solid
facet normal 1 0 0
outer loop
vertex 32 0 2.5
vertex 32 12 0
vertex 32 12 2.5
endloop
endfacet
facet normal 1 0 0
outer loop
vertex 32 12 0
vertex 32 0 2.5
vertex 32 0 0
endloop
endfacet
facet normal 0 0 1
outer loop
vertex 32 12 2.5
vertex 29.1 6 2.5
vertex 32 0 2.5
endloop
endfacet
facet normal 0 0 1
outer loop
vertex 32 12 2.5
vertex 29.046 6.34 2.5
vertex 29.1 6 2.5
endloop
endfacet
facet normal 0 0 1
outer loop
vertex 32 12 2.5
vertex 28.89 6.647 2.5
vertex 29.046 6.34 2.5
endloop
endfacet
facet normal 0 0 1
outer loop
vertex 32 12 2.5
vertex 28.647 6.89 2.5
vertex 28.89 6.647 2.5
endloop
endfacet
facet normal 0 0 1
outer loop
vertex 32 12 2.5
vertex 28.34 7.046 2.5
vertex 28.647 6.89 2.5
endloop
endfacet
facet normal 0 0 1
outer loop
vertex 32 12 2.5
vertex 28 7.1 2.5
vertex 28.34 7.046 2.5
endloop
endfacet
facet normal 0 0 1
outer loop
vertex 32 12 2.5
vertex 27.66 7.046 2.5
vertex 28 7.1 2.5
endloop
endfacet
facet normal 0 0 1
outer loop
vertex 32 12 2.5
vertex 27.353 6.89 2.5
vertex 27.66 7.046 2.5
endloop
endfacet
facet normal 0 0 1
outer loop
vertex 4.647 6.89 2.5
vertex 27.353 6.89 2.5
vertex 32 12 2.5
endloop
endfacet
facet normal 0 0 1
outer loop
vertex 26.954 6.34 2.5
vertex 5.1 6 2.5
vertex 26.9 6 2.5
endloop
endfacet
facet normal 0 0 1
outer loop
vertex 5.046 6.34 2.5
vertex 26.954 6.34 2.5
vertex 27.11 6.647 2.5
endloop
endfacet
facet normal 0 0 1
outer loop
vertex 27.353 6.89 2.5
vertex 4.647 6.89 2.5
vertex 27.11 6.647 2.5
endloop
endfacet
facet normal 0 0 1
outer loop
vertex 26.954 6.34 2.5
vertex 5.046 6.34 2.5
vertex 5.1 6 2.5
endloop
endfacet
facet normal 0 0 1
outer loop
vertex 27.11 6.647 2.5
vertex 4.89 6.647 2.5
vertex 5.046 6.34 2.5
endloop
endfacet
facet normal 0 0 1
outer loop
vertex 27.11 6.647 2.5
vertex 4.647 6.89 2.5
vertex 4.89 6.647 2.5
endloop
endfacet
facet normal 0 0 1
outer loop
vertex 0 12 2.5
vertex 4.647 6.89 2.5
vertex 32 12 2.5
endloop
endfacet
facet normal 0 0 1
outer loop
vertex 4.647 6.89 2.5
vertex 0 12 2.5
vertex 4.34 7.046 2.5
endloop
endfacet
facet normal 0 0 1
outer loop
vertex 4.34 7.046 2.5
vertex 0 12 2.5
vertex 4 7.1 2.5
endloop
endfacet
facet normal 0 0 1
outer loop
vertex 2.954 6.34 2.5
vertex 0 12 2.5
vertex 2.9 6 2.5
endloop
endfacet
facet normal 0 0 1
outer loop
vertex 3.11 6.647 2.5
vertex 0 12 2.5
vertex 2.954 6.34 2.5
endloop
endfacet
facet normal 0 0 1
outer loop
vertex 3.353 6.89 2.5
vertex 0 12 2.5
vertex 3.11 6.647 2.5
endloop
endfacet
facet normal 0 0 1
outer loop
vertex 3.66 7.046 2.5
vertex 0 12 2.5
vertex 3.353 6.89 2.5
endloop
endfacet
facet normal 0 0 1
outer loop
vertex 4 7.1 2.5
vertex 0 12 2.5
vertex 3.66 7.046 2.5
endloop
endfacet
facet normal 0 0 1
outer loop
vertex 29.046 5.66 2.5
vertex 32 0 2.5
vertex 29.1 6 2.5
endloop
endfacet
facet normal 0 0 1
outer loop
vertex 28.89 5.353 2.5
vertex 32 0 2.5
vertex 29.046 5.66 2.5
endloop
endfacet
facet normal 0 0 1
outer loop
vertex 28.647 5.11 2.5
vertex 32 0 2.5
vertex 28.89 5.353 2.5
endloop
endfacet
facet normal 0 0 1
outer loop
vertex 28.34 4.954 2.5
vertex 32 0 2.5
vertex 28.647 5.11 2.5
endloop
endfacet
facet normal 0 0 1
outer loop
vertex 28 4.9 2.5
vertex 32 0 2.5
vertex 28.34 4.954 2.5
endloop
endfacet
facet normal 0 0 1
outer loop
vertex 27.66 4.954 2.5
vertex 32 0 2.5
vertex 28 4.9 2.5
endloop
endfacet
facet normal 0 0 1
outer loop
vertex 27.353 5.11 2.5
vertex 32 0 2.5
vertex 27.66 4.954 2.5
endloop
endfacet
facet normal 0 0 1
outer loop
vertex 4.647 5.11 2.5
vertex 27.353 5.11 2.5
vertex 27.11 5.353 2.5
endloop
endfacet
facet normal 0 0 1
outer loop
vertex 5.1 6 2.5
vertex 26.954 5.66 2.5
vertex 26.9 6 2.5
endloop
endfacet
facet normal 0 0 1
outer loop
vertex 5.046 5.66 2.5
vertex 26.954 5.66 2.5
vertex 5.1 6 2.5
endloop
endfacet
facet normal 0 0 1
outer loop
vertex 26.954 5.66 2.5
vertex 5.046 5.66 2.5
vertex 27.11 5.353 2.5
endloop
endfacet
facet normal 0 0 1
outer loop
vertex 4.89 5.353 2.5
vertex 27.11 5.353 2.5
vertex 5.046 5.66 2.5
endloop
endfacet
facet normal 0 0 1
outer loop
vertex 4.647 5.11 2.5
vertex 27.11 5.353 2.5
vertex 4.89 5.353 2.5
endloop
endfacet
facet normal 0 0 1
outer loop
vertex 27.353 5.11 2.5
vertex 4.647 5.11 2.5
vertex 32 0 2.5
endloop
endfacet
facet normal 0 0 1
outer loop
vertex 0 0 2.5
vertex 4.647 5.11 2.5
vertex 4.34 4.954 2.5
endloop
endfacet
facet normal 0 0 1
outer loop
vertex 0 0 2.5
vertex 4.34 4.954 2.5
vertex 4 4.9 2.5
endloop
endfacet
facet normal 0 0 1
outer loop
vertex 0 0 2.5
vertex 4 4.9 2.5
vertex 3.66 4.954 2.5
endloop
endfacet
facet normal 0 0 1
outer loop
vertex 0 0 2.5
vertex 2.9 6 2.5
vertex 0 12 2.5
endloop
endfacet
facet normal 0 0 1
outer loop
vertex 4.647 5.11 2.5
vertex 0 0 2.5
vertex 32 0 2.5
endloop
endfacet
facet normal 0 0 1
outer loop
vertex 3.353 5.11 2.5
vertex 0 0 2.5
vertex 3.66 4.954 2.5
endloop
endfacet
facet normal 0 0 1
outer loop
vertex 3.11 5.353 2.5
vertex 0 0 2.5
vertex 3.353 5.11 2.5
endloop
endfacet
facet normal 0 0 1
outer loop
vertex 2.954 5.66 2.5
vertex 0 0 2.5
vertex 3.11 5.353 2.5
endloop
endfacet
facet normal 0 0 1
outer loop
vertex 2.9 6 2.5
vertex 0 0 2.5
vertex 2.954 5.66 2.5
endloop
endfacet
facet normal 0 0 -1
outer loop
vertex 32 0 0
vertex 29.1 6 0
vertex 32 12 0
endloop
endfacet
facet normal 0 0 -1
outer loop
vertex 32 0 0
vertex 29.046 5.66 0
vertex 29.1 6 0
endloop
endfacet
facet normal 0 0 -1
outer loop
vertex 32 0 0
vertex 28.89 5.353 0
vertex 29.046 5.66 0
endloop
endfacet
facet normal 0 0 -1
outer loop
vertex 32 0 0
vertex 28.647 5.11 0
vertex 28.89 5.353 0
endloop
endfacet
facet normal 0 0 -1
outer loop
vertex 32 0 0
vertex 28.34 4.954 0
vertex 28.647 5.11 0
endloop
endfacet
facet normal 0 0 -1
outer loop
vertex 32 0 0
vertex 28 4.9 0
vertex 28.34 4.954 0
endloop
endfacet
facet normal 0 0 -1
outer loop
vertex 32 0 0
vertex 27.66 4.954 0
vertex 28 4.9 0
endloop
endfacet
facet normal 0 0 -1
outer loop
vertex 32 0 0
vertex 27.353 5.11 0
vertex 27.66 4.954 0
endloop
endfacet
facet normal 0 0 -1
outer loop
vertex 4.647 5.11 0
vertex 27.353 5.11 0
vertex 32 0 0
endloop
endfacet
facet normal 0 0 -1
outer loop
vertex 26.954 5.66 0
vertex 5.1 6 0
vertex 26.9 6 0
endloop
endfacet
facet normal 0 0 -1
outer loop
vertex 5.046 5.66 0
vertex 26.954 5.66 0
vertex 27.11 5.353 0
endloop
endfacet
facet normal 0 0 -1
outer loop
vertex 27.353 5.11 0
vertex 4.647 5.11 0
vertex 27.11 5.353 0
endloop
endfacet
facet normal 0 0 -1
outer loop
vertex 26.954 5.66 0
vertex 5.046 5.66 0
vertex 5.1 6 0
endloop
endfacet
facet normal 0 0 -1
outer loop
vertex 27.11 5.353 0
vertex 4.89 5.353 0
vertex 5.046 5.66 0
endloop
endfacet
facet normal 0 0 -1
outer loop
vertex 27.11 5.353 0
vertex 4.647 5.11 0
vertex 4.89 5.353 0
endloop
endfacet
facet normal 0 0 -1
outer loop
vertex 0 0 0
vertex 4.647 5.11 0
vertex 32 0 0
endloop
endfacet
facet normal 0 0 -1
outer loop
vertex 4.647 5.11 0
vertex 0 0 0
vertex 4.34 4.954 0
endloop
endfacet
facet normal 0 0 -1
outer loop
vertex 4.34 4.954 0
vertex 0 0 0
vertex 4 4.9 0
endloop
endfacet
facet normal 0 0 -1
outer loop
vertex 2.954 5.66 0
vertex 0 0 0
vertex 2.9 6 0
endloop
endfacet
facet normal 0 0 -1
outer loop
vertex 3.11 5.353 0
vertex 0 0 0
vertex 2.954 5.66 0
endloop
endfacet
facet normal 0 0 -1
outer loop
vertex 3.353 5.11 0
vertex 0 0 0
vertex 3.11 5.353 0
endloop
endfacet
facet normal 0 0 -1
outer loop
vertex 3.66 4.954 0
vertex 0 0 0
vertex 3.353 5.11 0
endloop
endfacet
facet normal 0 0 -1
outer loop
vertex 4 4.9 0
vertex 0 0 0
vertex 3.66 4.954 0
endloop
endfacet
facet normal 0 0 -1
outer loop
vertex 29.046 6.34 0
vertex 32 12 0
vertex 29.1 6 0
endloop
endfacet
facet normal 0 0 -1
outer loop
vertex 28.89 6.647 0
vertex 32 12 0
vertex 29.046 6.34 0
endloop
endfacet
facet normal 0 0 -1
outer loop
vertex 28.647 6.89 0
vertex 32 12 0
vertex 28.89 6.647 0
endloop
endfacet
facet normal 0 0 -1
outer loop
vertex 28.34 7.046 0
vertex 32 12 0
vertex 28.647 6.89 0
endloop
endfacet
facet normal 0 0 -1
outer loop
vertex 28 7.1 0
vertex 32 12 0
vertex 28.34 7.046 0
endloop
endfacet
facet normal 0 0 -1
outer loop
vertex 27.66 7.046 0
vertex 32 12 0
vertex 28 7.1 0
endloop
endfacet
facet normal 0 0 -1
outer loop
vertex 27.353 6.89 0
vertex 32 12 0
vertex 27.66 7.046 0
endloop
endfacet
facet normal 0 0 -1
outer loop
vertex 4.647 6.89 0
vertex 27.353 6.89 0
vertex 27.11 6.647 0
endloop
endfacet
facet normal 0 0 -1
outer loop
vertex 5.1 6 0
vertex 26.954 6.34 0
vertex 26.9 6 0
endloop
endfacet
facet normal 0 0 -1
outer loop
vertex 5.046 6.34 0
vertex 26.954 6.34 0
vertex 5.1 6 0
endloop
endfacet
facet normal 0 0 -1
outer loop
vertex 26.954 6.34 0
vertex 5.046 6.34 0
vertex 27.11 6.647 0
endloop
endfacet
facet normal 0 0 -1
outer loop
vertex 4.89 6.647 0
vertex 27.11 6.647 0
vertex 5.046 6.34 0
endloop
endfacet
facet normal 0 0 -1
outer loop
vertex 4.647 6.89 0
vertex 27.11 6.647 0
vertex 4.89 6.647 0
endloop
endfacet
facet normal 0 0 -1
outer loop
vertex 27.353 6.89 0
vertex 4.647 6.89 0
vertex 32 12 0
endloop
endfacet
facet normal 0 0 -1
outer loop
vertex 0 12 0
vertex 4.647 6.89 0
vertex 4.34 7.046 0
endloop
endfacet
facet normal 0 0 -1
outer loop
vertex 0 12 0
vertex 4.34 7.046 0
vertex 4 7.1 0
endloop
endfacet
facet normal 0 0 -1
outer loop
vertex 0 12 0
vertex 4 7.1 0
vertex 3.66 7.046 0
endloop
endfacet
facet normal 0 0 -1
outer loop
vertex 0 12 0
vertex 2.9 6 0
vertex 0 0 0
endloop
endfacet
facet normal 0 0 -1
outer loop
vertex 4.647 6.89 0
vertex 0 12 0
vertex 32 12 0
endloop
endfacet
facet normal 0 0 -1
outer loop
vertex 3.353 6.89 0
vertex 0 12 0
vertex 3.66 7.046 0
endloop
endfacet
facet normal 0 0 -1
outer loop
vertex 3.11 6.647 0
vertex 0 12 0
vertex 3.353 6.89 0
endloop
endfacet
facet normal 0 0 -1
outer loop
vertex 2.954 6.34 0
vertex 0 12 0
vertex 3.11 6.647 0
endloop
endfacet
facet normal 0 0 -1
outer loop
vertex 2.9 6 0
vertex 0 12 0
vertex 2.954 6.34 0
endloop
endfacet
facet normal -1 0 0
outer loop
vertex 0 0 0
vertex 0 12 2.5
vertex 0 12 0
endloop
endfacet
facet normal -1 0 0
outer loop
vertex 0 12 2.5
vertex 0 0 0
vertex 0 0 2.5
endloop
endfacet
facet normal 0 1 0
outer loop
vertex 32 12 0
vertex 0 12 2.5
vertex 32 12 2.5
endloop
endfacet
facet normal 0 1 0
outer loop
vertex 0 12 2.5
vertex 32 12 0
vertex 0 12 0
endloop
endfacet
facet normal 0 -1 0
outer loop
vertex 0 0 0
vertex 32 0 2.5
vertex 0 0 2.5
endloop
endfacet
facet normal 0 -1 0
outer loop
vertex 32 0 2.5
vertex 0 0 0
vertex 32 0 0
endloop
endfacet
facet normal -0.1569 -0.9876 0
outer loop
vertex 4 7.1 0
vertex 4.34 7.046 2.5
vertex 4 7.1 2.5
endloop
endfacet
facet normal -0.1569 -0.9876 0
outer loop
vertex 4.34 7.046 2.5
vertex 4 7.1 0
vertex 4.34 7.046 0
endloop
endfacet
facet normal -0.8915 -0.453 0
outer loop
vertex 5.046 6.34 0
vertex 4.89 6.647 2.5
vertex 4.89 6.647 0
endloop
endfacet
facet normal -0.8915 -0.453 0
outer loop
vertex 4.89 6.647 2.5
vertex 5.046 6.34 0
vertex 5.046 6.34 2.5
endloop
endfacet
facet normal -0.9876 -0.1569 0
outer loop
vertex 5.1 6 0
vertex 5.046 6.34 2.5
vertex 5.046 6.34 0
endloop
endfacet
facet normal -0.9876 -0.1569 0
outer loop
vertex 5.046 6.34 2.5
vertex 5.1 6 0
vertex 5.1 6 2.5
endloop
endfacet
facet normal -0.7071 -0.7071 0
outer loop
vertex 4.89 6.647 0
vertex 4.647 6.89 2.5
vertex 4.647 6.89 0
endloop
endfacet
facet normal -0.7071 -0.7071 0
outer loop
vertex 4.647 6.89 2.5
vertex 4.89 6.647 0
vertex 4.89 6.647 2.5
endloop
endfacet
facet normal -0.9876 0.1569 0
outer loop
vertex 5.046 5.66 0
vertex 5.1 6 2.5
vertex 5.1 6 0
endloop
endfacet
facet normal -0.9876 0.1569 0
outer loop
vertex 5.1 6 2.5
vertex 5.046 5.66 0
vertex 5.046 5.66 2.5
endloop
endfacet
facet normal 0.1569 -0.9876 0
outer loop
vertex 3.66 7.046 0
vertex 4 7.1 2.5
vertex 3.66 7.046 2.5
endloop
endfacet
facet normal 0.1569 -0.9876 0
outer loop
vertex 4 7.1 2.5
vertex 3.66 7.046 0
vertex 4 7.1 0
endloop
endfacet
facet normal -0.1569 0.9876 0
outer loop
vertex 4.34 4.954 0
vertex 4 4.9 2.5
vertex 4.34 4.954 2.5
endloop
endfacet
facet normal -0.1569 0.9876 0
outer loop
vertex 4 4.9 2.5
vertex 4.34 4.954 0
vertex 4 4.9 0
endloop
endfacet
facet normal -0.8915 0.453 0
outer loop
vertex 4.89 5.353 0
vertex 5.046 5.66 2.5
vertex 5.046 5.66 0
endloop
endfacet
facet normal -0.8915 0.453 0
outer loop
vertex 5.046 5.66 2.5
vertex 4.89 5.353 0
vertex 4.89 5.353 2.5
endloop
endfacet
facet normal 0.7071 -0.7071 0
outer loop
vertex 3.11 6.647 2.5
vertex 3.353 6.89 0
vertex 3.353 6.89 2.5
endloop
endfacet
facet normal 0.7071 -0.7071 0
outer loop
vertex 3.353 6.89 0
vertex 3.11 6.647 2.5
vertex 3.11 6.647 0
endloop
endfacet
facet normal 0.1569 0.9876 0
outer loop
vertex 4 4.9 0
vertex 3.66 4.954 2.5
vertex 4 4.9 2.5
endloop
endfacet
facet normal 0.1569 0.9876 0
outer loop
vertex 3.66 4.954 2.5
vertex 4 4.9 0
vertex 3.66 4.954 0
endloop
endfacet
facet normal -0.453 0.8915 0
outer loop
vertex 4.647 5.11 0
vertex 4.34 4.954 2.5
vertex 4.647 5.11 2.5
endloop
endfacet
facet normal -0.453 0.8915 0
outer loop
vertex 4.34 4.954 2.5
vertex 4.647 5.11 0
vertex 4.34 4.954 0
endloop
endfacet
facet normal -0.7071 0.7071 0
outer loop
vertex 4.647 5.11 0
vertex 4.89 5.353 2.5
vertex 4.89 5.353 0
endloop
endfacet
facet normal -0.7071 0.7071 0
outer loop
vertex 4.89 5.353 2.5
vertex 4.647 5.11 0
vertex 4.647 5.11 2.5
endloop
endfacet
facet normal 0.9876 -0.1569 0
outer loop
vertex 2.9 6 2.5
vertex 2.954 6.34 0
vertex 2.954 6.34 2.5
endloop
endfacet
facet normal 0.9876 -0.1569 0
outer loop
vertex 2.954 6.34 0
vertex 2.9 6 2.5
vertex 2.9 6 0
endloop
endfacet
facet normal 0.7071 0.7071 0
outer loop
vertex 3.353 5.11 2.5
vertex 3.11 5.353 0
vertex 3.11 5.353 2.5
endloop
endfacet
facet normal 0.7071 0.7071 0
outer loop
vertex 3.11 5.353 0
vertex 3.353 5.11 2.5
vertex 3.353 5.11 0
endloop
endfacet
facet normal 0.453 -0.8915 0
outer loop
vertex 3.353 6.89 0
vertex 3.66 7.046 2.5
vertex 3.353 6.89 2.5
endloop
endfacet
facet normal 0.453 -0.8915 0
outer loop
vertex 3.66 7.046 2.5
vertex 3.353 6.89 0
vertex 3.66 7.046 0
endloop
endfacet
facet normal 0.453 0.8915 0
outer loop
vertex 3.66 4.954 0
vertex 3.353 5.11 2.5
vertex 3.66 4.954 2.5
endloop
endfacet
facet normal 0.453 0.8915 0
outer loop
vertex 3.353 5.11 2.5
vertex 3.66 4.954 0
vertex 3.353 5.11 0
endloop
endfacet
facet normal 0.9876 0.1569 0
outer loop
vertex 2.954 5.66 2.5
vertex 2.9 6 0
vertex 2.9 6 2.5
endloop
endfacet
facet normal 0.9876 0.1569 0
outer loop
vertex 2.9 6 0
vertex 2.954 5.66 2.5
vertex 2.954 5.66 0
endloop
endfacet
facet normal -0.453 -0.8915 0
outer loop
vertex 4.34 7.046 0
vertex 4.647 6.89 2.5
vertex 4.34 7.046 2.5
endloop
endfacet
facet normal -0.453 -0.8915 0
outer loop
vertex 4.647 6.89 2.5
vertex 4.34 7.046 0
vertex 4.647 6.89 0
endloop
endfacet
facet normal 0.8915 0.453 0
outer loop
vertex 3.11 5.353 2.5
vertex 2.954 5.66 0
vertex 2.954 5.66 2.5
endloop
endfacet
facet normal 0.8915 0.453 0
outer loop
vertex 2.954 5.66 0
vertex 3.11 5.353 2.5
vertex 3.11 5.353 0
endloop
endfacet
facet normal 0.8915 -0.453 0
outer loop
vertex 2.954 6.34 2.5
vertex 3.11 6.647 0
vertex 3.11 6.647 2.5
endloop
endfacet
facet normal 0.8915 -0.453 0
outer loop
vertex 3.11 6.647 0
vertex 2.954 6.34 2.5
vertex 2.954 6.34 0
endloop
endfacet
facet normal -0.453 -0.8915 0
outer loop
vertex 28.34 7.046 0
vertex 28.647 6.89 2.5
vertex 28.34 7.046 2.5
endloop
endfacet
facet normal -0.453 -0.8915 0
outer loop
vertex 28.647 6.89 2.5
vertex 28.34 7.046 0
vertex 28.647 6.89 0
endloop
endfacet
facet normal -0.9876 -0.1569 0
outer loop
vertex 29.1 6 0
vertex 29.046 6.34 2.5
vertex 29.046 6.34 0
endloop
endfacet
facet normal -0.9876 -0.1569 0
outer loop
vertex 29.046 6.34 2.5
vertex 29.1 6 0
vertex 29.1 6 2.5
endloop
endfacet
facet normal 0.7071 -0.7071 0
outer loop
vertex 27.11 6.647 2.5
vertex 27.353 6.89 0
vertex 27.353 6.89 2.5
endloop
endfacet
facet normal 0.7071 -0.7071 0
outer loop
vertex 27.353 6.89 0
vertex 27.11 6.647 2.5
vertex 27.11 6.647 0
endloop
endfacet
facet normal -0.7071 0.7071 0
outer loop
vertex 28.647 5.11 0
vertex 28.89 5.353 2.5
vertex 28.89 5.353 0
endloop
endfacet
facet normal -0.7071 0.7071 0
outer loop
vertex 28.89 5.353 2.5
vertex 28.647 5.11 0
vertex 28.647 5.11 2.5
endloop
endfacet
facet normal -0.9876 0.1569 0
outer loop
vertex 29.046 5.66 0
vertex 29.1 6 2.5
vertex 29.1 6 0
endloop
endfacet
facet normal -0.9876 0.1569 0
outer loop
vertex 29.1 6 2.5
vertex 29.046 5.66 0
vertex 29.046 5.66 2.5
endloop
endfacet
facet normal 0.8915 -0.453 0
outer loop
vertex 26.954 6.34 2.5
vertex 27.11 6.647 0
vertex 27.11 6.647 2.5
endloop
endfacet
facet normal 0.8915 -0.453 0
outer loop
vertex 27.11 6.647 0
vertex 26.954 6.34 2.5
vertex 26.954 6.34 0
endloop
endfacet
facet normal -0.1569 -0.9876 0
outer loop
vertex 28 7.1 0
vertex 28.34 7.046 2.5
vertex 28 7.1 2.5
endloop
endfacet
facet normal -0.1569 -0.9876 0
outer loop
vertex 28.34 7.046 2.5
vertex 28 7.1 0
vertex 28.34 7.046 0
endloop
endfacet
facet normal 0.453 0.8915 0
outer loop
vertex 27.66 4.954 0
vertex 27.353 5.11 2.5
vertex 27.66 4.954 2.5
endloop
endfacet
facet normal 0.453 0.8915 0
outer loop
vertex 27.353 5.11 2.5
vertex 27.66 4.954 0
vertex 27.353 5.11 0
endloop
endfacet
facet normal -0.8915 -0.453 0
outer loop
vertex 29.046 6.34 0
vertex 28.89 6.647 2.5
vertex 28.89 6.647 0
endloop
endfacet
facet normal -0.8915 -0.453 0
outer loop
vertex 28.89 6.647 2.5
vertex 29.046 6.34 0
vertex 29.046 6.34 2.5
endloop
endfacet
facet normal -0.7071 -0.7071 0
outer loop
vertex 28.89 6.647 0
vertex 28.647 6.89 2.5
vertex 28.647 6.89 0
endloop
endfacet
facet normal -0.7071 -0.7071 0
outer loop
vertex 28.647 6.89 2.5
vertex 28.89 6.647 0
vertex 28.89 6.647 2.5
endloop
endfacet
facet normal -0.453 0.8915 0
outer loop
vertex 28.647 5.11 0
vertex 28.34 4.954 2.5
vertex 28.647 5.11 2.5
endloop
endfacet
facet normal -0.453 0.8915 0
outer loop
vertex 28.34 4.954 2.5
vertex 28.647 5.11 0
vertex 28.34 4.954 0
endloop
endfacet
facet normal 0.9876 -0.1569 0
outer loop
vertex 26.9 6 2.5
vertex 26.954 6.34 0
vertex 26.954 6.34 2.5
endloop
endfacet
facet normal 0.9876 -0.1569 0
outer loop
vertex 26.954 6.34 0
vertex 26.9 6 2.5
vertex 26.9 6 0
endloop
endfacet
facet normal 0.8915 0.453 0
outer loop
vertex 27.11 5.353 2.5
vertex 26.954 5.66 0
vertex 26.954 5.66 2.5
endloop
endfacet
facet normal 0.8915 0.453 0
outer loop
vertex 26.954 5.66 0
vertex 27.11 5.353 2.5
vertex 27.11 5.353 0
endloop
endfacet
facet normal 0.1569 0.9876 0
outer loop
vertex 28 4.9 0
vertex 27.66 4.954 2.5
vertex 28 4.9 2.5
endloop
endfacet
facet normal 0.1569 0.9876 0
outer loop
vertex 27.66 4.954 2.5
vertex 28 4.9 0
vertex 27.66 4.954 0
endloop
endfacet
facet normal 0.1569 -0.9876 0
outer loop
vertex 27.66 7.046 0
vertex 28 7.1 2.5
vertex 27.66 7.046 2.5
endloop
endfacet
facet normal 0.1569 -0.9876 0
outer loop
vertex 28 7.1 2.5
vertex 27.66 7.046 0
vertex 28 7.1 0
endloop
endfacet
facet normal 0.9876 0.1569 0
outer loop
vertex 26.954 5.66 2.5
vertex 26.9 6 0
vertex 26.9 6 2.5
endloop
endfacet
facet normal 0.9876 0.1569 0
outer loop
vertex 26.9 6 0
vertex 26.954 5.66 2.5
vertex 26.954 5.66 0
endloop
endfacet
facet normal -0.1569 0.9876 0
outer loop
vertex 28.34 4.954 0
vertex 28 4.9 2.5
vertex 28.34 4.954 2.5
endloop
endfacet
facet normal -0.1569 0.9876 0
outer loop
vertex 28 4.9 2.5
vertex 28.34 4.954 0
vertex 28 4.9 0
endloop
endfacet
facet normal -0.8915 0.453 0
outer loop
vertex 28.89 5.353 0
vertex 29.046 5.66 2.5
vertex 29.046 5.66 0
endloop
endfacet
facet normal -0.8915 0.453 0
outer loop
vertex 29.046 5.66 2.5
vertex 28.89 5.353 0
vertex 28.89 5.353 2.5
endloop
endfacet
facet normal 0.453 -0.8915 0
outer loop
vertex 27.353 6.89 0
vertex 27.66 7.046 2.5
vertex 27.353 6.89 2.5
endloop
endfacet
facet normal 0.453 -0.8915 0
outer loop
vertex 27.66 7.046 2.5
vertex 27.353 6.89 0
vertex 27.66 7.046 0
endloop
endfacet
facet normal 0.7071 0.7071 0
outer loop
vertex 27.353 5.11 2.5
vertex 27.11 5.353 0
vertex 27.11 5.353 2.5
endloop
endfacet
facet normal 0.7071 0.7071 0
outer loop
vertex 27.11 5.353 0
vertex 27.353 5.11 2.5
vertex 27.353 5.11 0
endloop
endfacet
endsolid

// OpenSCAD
module sg90_bracket(t=2.5){
  difference(){
    cube([32,12,t]);
    translate([4,6,-0.1]) cylinder(h=t+0.2,r=1.1,$fn=20);
    translate([28,6,-0.1]) cylinder(h=t+0.2,r=1.1,$fn=20);
  }
}
sg90_bracket();
